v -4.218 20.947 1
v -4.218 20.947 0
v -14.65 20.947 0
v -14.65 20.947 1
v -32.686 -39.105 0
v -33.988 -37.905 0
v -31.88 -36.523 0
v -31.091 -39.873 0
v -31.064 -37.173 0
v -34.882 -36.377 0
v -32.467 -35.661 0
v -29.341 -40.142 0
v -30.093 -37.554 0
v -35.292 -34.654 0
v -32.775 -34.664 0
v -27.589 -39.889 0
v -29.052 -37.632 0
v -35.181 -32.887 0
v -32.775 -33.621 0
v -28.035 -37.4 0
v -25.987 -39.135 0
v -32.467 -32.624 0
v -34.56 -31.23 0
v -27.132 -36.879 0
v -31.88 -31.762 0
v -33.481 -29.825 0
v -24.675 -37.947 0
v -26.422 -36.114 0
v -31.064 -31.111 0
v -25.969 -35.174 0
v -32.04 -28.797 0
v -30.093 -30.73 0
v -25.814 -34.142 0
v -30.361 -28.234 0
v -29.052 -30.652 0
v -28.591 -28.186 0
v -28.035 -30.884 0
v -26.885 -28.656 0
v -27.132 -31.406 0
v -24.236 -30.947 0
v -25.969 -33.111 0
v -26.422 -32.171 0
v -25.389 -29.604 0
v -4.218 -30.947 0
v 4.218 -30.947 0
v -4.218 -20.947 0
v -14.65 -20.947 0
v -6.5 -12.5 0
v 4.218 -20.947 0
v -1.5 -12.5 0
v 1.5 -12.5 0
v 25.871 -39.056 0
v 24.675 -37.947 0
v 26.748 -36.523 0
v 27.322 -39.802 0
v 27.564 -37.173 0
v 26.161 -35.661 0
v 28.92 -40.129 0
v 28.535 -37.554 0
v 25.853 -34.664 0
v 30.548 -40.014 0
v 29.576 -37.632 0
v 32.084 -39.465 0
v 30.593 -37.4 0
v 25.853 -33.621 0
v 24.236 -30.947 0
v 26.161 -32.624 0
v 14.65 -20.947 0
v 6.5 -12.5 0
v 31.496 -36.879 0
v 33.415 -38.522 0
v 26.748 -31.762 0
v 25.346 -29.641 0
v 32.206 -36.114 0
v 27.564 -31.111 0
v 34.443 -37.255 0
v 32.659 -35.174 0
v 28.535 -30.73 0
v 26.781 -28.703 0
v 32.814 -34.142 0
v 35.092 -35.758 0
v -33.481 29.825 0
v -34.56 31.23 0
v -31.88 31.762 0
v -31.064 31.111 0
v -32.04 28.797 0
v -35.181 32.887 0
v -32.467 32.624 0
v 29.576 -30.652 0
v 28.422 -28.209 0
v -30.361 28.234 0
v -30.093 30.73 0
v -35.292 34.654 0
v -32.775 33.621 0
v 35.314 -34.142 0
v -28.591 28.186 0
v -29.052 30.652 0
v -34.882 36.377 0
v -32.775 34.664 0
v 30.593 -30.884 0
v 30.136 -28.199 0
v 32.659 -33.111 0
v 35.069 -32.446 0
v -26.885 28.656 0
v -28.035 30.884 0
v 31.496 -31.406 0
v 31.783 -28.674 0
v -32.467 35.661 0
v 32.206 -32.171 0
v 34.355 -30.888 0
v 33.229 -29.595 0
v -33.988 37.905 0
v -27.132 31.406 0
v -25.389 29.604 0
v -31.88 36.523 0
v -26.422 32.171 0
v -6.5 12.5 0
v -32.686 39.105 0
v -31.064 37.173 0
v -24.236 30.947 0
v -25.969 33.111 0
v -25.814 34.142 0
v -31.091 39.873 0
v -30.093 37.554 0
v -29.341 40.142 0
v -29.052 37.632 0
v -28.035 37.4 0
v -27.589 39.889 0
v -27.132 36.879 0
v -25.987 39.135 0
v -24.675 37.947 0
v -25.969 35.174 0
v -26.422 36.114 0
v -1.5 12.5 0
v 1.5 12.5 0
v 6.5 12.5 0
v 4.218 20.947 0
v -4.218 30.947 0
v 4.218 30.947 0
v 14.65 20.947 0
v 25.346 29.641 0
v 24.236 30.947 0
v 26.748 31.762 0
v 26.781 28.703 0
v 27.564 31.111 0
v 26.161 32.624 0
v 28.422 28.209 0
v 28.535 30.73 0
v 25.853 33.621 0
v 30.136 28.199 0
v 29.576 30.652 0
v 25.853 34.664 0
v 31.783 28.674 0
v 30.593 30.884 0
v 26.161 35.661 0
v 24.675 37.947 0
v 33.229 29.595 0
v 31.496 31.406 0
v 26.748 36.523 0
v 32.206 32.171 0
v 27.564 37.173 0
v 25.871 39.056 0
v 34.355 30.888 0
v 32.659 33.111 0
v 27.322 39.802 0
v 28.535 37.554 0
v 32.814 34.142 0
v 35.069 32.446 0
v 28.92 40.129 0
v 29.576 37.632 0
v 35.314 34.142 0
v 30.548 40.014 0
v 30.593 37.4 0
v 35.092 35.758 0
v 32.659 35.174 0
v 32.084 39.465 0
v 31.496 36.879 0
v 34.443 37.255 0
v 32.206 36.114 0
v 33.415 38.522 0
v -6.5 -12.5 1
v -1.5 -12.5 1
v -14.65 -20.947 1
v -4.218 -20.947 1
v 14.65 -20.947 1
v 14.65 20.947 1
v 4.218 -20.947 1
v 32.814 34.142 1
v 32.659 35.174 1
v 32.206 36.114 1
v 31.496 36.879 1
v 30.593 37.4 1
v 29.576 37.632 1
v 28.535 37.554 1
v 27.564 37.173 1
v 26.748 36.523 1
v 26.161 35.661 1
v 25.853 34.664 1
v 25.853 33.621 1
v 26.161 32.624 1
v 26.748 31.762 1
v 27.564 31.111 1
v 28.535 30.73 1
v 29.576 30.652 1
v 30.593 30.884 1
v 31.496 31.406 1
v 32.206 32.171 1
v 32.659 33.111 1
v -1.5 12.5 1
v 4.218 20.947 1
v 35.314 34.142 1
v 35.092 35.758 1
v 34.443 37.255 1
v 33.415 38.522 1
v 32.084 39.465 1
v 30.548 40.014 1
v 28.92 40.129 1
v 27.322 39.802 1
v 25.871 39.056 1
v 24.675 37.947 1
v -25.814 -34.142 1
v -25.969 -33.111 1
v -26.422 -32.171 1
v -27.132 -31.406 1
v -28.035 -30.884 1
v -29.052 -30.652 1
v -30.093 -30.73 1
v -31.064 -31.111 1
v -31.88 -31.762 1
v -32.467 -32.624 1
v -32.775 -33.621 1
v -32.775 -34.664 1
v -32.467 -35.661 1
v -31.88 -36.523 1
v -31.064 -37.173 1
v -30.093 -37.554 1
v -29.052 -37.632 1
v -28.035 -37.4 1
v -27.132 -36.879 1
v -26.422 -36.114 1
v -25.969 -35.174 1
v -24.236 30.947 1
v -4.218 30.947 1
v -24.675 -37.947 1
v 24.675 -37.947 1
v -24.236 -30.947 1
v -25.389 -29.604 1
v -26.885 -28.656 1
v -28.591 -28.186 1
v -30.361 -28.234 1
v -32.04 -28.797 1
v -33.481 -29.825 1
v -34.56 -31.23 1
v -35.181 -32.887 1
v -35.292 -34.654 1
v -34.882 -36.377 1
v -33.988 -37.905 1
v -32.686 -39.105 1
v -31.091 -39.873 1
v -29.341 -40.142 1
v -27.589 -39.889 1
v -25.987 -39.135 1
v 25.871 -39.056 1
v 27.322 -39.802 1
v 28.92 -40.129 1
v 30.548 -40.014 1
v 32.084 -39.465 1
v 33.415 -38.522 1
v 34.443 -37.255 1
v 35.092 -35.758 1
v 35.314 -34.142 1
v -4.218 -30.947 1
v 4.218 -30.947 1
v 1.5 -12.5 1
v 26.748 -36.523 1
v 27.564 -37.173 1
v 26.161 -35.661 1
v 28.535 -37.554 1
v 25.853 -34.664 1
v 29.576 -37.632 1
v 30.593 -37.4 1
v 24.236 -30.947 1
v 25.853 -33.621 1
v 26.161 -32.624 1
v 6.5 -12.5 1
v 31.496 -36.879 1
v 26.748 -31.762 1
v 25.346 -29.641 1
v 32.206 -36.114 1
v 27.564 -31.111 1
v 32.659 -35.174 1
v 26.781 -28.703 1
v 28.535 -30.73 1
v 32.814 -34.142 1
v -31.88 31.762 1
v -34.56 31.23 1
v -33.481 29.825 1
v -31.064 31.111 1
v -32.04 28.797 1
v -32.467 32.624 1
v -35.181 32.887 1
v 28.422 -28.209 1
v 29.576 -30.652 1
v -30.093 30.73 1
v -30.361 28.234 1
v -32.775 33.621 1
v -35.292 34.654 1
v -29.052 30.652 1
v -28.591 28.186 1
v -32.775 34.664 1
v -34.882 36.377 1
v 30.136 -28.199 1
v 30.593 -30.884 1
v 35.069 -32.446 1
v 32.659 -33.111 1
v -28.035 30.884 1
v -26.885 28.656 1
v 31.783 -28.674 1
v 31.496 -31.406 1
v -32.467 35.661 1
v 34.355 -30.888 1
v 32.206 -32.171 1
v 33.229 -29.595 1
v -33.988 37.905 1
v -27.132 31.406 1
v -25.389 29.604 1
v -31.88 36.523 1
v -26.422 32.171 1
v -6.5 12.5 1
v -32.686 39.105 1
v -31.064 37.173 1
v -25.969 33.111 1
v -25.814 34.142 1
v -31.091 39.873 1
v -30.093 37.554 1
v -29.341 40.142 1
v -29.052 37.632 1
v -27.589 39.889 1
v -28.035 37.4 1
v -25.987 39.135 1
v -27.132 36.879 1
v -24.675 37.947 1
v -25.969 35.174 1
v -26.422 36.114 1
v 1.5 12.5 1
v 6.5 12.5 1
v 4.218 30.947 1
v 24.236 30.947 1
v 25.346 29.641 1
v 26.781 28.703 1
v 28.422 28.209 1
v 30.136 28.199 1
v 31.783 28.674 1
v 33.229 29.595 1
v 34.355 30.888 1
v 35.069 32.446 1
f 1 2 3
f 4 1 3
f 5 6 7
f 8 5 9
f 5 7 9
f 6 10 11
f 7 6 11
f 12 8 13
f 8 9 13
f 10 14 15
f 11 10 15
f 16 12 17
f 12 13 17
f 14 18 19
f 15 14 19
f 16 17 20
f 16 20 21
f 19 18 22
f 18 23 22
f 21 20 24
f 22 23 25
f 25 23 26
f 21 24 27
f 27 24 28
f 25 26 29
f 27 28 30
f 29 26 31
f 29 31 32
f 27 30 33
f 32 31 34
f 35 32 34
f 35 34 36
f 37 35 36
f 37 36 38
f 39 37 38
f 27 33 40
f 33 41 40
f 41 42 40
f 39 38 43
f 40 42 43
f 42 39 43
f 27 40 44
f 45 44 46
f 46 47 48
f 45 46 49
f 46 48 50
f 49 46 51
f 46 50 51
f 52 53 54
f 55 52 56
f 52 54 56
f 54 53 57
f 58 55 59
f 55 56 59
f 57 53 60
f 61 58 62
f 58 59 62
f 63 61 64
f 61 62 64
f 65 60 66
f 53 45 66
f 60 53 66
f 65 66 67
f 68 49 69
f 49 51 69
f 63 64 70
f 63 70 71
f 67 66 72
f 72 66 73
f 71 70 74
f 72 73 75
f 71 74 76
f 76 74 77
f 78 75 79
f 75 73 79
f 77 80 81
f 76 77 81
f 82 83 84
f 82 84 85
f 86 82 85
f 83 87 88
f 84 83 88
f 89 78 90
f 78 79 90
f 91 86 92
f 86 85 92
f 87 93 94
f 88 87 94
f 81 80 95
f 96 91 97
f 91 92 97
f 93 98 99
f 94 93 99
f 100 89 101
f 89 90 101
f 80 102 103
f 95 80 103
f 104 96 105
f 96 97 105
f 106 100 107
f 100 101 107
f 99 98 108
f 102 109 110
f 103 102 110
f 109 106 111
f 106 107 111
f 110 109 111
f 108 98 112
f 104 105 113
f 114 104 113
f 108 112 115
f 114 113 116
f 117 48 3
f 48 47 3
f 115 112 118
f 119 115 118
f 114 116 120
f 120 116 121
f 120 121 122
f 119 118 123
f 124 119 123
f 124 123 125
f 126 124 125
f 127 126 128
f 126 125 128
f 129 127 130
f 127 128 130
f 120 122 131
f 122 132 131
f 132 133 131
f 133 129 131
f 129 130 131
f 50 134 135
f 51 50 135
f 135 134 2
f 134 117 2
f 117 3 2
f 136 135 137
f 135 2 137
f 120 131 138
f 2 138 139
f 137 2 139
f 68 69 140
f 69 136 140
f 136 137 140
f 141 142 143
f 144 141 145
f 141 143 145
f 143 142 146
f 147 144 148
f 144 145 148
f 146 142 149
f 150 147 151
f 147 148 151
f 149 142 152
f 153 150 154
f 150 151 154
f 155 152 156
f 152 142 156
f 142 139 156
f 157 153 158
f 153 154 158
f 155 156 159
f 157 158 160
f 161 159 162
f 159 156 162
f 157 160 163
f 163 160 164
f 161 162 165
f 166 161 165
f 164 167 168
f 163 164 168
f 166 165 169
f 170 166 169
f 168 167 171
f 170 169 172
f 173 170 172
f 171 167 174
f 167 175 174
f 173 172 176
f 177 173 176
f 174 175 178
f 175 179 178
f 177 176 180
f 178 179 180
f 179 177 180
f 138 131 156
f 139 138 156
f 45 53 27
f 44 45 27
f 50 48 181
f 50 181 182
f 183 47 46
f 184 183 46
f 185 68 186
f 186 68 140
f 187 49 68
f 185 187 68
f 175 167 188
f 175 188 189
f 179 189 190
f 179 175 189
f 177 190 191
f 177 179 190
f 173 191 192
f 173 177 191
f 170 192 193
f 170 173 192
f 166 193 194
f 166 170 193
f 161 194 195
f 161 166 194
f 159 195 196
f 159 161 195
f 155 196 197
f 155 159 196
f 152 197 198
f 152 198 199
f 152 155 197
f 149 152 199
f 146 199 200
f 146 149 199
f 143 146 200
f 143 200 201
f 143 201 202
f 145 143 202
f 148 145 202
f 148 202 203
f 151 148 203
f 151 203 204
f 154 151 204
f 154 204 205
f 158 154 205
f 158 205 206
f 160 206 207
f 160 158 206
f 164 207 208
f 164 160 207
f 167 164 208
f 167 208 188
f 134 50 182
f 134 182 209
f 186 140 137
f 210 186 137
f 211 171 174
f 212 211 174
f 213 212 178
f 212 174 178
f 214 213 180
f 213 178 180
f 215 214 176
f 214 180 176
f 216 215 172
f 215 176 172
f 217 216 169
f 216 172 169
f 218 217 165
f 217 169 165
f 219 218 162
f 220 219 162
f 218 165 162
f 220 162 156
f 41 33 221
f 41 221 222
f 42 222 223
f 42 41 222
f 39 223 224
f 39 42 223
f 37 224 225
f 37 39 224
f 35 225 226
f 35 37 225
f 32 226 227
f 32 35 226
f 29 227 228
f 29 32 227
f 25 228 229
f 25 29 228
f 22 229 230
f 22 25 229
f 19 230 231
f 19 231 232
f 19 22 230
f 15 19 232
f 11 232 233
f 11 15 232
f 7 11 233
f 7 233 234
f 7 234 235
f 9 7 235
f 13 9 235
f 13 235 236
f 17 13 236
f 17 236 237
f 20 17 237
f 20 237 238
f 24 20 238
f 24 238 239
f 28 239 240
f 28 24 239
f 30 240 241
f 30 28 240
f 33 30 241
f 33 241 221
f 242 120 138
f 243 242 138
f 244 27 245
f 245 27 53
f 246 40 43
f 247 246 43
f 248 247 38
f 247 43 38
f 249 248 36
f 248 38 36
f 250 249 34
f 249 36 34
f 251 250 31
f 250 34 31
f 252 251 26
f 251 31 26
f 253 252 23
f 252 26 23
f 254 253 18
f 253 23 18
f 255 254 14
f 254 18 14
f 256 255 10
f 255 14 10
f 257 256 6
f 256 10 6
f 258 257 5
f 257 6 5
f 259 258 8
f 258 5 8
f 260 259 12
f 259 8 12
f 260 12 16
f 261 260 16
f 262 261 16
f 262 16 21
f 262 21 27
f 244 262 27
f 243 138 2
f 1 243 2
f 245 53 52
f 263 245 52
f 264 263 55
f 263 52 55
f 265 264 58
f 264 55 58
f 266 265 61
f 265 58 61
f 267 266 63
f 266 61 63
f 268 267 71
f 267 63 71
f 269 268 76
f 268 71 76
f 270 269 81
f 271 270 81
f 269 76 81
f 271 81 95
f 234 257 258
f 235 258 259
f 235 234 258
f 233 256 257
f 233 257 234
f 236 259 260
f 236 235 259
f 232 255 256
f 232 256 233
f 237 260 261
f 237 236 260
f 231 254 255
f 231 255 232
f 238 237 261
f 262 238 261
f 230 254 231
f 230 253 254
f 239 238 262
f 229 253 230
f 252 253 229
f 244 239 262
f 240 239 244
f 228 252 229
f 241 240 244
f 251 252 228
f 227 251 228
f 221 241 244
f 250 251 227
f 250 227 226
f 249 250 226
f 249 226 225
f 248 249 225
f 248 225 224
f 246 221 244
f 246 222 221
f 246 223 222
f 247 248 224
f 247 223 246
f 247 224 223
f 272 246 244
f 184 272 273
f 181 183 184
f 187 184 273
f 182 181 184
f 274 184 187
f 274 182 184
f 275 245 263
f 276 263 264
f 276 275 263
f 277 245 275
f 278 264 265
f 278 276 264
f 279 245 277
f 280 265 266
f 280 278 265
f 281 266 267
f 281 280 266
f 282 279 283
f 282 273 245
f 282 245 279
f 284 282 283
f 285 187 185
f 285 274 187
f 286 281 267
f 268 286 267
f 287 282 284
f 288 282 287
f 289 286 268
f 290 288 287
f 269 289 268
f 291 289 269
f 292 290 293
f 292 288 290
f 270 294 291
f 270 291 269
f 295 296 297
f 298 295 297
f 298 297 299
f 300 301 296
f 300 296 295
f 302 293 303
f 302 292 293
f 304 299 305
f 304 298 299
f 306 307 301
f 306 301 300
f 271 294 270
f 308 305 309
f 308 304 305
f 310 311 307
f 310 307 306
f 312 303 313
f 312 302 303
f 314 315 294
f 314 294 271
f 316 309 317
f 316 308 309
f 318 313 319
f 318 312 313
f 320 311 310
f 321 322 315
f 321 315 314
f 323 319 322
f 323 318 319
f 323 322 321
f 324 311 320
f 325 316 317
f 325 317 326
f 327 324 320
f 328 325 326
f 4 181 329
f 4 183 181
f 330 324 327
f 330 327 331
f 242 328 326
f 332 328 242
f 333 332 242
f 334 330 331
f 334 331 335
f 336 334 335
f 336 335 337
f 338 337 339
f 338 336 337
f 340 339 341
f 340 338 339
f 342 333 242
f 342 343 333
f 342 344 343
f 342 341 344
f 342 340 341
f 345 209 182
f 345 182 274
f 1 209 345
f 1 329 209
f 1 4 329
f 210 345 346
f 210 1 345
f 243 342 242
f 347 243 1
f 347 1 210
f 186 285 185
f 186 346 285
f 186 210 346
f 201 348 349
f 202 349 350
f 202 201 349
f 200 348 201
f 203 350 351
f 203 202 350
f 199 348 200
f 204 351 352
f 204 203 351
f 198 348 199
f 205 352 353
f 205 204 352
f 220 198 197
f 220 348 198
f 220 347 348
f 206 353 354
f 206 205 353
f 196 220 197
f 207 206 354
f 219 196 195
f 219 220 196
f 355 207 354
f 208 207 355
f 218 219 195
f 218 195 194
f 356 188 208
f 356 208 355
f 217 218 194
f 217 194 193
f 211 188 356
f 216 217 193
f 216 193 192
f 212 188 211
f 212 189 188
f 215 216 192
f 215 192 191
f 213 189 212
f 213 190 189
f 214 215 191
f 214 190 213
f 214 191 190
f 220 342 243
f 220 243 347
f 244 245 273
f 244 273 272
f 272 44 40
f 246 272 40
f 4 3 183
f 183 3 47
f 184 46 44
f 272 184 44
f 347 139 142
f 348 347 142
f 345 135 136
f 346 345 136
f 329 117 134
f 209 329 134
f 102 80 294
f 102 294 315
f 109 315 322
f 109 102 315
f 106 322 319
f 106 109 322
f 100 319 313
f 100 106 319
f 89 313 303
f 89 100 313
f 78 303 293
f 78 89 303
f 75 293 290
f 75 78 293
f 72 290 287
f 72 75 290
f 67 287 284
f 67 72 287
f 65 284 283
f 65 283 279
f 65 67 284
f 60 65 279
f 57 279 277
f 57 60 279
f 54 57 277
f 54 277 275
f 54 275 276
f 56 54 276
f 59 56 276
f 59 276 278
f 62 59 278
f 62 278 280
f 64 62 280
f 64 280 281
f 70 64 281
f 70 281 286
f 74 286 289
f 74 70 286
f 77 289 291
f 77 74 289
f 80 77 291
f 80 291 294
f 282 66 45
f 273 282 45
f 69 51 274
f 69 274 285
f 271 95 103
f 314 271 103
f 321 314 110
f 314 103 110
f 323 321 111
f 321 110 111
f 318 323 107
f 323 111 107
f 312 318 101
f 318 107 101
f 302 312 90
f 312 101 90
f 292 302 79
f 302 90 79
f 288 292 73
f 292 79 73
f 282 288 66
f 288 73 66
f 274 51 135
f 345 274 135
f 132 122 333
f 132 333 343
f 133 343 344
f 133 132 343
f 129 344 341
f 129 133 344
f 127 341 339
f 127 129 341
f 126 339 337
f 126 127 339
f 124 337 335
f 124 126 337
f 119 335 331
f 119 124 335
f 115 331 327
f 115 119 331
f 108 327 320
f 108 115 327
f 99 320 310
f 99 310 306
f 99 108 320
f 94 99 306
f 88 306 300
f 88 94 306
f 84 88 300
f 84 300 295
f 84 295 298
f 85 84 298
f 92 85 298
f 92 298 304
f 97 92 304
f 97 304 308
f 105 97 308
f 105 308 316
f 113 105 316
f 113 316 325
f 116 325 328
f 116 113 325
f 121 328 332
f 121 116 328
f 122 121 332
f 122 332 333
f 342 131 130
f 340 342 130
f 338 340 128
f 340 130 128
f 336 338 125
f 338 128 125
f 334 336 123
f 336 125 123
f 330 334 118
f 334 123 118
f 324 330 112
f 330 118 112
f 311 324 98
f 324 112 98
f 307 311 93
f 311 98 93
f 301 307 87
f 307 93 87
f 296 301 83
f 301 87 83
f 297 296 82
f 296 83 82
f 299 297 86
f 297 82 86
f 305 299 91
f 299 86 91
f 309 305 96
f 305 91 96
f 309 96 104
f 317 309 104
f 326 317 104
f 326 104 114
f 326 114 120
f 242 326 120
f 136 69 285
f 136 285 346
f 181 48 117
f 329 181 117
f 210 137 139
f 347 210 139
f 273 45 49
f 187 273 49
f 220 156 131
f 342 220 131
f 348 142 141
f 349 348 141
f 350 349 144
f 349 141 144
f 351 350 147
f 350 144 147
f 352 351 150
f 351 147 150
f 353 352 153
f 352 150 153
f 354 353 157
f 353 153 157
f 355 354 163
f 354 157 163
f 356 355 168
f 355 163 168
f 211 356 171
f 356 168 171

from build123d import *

# Parameters (mm, degrees)
F0_R     = 3.5
F0_W     = 5
F0_H     = 25
F1_DEPTH = 1


with BuildPart() as f1:
    # F0 (on Top) → F1 (new body)
    with BuildSketch(Plane.XY):
        with BuildLine():
            ThreePointArc((24.235588, 30.946928), (30.976758, 28.377192), (35.314001, 34.142193))
            ThreePointArc((35.314001, 34.142193), (31.334351, 39.791811), (24.674606, 37.946928))
            ThreePointArc((24.674606, 37.946928), (23.325767, 34.517756), (24.235588, 30.946928))
        make_face()
        with Locations((29.314001, 34.142193)):
            Circle(F0_R, mode=Mode.SUBTRACT)
        with BuildLine():
            ThreePointArc((24.235588, 30.946928), (23.325767, 34.517756), (24.674606, 37.946928))
            Line((24.674606, 37.946928), (0, 37.946928))
            Line((0, 37.946928), (-24.674606, 37.946928))
            ThreePointArc((-24.674606, 37.946928), (-23.664383, 36.162543), (-23.314001, 34.142193))
            ThreePointArc((-23.314001, 34.142193), (-23.549, 32.479436), (-24.235588, 30.946928))
            Line((-24.235588, 30.946928), (-4.218093, 30.946928))
            Line((-4.218093, 30.946928), (-4.218093, 20.946928))
            Line((-4.218093, 20.946928), (-14.650477, 20.946928))
            Line((-14.650477, 20.946928), (-14.650477, 0))
            Line((-14.650477, 0), (-14.650477, -20.946928))
            Line((-14.650477, -20.946928), (-4.218093, -20.946928))
            Line((-4.218093, -20.946928), (-4.218093, -30.946928))
            Line((-4.218093, -30.946928), (-24.235588, -30.946928))
            ThreePointArc((-24.235588, -30.946928), (-23.549, -32.479436), (-23.314001, -34.142193))
            ThreePointArc((-23.314001, -34.142193), (-23.664383, -36.162543), (-24.674606, -37.946928))
            Line((-24.674606, -37.946928), (0, -37.946928))
            Line((0, -37.946928), (24.674606, -37.946928))
            ThreePointArc((24.674606, -37.946928), (23.325767, -34.517756), (24.235588, -30.946928))
            Line((24.235588, -30.946928), (4.218093, -30.946928))
            Line((4.218093, -30.946928), (4.218093, -20.946928))
            Line((4.218093, -20.946928), (14.650477, -20.946928))
            Line((14.650477, -20.946928), (14.650477, 0))
            Line((14.650477, 0), (14.650477, 20.946928))
            Line((14.650477, 20.946928), (4.218093, 20.946928))
            Line((4.218093, 20.946928), (4.218093, 30.946928))
            Line((4.218093, 30.946928), (24.235588, 30.946928))
        make_face()
        with Locations((-4, 0)):
            Rectangle(F0_W, F0_H, mode=Mode.SUBTRACT)
        with Locations((4, 0)):
            Rectangle(F0_W, F0_H, mode=Mode.SUBTRACT)
        with BuildLine():
            ThreePointArc((-23.314001, 34.142193), (-23.664383, 36.162543), (-24.674606, 37.946928))
            ThreePointArc((-24.674606, 37.946928), (-35.302236, 33.76663), (-24.235588, 30.946928))
            ThreePointArc((-24.235588, 30.946928), (-23.549, 32.479436), (-23.314001, 34.142193))
        make_face()
        with Locations((-29.314001, 34.142193)):
            Circle(F0_R, mode=Mode.SUBTRACT)
        with BuildLine():
            ThreePointArc((35.314001, -34.142193), (30.976758, -28.377192), (24.235588, -30.946928))
            ThreePointArc((24.235588, -30.946928), (23.325767, -34.517756), (24.674606, -37.946928))
            ThreePointArc((24.674606, -37.946928), (31.334351, -39.791811), (35.314001, -34.142193))
        make_face()
        with Locations((29.314001, -34.142193)):
            Circle(F0_R, mode=Mode.SUBTRACT)
        with BuildLine():
            ThreePointArc((-23.314001, -34.142193), (-23.549, -32.479436), (-24.235588, -30.946928))
            ThreePointArc((-24.235588, -30.946928), (-35.302236, -33.76663), (-24.674606, -37.946928))
            ThreePointArc((-24.674606, -37.946928), (-23.664383, -36.162543), (-23.314001, -34.142193))
        make_face()
        with Locations((-29.314001, -34.142193)):
            Circle(F0_R, mode=Mode.SUBTRACT)
    extrude(amount=F1_DEPTH)


solid = f1.part
